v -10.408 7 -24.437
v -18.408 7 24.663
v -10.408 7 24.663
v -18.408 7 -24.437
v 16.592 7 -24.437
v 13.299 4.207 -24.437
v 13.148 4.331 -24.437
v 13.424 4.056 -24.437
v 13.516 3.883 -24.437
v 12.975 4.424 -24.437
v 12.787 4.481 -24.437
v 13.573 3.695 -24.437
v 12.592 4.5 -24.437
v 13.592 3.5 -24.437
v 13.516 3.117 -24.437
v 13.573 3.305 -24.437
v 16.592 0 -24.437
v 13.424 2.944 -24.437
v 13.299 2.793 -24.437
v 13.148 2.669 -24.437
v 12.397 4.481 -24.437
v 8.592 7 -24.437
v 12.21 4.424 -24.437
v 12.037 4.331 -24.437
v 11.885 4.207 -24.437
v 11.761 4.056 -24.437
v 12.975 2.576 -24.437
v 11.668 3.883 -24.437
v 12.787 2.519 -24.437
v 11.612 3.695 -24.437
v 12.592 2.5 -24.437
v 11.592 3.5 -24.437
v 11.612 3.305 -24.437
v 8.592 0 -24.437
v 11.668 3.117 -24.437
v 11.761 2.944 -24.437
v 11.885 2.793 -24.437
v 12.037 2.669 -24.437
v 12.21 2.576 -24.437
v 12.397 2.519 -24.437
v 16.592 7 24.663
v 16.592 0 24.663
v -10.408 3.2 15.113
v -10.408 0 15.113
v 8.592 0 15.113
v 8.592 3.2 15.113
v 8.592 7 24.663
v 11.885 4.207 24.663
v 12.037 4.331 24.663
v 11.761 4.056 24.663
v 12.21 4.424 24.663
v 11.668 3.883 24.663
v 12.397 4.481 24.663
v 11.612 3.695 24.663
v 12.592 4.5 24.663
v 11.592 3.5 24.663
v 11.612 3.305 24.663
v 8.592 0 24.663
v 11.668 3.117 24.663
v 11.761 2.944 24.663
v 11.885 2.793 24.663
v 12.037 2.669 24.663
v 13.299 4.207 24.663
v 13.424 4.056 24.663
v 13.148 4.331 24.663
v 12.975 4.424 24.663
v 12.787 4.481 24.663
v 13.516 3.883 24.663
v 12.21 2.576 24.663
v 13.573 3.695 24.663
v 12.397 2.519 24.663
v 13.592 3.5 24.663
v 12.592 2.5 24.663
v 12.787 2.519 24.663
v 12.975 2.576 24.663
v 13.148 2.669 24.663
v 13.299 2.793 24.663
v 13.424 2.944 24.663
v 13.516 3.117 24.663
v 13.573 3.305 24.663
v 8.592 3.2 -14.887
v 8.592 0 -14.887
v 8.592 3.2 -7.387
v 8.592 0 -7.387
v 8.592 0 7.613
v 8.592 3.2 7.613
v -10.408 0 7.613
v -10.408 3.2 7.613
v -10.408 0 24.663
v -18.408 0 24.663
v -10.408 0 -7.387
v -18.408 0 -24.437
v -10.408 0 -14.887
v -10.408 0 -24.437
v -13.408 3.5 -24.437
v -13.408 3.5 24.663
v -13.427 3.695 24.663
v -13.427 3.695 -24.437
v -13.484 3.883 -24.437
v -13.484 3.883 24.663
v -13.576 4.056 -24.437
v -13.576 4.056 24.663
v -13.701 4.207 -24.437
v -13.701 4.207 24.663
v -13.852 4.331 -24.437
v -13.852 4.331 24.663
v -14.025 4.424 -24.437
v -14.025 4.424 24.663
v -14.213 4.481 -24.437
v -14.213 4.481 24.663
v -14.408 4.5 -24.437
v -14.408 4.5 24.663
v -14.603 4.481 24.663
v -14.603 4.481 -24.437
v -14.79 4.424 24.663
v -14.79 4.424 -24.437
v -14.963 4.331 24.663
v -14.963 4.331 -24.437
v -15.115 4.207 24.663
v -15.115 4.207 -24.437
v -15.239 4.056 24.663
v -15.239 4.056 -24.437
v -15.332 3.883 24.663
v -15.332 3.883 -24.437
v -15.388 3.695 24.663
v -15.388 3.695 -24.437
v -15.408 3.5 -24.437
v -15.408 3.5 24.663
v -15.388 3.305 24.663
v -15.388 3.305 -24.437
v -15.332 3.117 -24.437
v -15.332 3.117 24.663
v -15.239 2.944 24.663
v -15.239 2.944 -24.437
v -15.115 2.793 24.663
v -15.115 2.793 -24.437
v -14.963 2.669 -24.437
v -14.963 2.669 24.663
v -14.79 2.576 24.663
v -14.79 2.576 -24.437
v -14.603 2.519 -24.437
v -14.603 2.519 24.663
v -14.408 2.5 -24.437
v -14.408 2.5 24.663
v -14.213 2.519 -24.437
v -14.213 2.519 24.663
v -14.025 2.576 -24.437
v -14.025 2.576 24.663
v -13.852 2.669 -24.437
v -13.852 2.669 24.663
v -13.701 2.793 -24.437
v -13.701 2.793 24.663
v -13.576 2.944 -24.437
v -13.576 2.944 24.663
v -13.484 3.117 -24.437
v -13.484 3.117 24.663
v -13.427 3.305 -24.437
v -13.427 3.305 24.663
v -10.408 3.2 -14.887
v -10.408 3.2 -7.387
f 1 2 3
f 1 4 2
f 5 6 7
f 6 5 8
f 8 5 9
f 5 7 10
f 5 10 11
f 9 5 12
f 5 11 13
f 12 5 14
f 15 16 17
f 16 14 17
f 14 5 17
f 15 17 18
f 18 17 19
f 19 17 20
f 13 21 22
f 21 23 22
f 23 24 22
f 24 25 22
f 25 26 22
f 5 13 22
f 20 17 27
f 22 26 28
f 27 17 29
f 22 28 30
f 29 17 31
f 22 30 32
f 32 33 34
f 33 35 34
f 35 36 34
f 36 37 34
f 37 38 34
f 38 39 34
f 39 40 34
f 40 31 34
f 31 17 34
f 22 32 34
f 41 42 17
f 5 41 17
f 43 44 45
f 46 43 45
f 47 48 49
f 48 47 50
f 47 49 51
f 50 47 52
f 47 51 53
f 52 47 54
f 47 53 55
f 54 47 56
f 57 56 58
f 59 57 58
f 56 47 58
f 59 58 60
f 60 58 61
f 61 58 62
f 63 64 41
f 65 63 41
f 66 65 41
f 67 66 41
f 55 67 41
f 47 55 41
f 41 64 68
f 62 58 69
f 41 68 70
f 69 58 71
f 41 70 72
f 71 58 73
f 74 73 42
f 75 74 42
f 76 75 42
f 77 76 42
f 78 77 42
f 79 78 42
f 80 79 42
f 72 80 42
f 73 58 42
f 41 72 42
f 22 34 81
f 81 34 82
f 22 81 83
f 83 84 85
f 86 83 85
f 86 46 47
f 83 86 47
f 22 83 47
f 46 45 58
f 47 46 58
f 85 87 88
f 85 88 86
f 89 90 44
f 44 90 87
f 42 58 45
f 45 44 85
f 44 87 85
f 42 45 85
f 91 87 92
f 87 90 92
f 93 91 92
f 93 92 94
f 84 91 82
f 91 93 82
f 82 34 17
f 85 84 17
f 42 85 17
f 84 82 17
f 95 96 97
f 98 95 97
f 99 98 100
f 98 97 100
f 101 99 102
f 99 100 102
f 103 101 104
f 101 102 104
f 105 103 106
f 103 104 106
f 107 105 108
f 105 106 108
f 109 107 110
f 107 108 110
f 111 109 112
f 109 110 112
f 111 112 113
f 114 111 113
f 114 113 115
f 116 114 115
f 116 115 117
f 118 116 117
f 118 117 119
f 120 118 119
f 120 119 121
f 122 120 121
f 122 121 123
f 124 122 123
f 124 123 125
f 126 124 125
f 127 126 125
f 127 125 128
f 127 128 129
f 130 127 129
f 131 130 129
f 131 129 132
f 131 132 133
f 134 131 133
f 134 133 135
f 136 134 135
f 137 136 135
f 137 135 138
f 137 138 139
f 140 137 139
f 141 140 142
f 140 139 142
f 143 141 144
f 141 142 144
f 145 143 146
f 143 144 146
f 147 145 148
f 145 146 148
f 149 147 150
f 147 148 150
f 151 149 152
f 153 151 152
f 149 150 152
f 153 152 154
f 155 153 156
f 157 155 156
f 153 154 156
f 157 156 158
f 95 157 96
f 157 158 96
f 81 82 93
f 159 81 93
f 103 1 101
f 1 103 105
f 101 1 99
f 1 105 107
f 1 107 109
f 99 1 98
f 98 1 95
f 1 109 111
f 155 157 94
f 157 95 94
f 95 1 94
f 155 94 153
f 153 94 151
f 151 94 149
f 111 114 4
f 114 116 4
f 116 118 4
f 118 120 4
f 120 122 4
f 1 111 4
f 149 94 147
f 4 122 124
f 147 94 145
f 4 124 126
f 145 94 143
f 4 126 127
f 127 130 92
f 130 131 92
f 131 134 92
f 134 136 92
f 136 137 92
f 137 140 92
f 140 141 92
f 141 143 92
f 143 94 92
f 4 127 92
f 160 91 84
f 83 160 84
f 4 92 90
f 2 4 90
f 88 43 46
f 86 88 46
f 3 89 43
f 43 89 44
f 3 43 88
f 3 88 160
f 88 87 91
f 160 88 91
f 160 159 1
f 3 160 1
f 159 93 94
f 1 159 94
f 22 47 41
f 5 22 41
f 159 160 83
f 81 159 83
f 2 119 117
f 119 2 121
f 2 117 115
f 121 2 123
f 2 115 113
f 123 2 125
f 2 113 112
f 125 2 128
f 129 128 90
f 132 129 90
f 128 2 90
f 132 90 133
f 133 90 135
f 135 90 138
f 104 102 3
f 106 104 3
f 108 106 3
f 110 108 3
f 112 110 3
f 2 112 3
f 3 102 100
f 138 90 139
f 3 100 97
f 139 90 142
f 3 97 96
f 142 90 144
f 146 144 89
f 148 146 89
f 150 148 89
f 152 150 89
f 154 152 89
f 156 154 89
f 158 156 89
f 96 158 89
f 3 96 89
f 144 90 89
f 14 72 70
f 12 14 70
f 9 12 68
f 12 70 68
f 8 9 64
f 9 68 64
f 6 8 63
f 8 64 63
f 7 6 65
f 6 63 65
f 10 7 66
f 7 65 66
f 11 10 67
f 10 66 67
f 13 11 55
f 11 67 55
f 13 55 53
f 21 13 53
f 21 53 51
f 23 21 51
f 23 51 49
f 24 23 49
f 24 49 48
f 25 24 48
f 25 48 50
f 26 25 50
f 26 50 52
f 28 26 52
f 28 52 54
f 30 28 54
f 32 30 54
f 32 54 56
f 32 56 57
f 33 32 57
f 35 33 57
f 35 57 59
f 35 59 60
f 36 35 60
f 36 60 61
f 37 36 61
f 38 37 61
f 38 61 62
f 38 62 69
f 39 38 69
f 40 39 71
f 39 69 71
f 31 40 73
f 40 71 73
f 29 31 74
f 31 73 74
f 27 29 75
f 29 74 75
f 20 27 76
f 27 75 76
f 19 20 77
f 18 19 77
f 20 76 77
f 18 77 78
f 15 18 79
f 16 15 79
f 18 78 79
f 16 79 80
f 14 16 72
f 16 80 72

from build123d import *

# Parameters (mm, degrees)
CROQUIS1_W              = 19
CROQUIS1_H              = 15
SALIENTE_EXTRUIR1_DEPTH = 7
CROQUIS3_W              = 19
CROQUIS3_H              = 3.8
CORTAR_EXTRUIR1_DEPTH   = 37.9
CROQUIS4_R              = 1
CORTAR_EXTRUIR2_DEPTH   = 51.9


with BuildPart() as part:
    # Croquis1 → Saliente-Extruir1 (new body)
    with BuildSketch(Plane(origin=(0, 0, 0), x_dir=(1, 0, 0), z_dir=(0, 1, 0))):
        Polygon((16.592354246, -24.663454956), (16.592354246, 24.436543518), (8.592354246, 24.436543518), (8.592354246, 14.886544281), (-10.407645754, 14.886544281), (-10.407645754, 24.436543518), (-18.407645754, 24.436543518), (-18.407645754, -24.663454956), (-10.407645754, -24.663454956), (-10.407645754, -15.113455719), (8.592354246, -15.113455719), (8.592354246, -24.663454956), align=None)
        with Locations((-0.907645754, -0.113455719)):
            Rectangle(CROQUIS1_W, CROQUIS1_H, mode=Mode.SUBTRACT)
    extrude(amount=SALIENTE_EXTRUIR1_DEPTH)

    # Croquis3 → Cortar-Extruir1 (cut)
    with BuildSketch(Plane.XY.offset(15.113455719)):
        with Locations((-0.907645754, 5.1)):
            Rectangle(CROQUIS3_W, CROQUIS3_H)
    extrude(amount=-CORTAR_EXTRUIR1_DEPTH, mode=Mode.SUBTRACT)

    # Croquis4 → Cortar-Extruir2 (cut)
    with BuildSketch(Plane.XY.offset(24.663454956)):
        with Locations((12.592354246, 3.5)):
            Circle(CROQUIS4_R)
        with Locations((-14.407645754, 3.5)):
            Circle(CROQUIS4_R)
    extrude(amount=-CORTAR_EXTRUIR2_DEPTH, mode=Mode.SUBTRACT)


solid = part.part
